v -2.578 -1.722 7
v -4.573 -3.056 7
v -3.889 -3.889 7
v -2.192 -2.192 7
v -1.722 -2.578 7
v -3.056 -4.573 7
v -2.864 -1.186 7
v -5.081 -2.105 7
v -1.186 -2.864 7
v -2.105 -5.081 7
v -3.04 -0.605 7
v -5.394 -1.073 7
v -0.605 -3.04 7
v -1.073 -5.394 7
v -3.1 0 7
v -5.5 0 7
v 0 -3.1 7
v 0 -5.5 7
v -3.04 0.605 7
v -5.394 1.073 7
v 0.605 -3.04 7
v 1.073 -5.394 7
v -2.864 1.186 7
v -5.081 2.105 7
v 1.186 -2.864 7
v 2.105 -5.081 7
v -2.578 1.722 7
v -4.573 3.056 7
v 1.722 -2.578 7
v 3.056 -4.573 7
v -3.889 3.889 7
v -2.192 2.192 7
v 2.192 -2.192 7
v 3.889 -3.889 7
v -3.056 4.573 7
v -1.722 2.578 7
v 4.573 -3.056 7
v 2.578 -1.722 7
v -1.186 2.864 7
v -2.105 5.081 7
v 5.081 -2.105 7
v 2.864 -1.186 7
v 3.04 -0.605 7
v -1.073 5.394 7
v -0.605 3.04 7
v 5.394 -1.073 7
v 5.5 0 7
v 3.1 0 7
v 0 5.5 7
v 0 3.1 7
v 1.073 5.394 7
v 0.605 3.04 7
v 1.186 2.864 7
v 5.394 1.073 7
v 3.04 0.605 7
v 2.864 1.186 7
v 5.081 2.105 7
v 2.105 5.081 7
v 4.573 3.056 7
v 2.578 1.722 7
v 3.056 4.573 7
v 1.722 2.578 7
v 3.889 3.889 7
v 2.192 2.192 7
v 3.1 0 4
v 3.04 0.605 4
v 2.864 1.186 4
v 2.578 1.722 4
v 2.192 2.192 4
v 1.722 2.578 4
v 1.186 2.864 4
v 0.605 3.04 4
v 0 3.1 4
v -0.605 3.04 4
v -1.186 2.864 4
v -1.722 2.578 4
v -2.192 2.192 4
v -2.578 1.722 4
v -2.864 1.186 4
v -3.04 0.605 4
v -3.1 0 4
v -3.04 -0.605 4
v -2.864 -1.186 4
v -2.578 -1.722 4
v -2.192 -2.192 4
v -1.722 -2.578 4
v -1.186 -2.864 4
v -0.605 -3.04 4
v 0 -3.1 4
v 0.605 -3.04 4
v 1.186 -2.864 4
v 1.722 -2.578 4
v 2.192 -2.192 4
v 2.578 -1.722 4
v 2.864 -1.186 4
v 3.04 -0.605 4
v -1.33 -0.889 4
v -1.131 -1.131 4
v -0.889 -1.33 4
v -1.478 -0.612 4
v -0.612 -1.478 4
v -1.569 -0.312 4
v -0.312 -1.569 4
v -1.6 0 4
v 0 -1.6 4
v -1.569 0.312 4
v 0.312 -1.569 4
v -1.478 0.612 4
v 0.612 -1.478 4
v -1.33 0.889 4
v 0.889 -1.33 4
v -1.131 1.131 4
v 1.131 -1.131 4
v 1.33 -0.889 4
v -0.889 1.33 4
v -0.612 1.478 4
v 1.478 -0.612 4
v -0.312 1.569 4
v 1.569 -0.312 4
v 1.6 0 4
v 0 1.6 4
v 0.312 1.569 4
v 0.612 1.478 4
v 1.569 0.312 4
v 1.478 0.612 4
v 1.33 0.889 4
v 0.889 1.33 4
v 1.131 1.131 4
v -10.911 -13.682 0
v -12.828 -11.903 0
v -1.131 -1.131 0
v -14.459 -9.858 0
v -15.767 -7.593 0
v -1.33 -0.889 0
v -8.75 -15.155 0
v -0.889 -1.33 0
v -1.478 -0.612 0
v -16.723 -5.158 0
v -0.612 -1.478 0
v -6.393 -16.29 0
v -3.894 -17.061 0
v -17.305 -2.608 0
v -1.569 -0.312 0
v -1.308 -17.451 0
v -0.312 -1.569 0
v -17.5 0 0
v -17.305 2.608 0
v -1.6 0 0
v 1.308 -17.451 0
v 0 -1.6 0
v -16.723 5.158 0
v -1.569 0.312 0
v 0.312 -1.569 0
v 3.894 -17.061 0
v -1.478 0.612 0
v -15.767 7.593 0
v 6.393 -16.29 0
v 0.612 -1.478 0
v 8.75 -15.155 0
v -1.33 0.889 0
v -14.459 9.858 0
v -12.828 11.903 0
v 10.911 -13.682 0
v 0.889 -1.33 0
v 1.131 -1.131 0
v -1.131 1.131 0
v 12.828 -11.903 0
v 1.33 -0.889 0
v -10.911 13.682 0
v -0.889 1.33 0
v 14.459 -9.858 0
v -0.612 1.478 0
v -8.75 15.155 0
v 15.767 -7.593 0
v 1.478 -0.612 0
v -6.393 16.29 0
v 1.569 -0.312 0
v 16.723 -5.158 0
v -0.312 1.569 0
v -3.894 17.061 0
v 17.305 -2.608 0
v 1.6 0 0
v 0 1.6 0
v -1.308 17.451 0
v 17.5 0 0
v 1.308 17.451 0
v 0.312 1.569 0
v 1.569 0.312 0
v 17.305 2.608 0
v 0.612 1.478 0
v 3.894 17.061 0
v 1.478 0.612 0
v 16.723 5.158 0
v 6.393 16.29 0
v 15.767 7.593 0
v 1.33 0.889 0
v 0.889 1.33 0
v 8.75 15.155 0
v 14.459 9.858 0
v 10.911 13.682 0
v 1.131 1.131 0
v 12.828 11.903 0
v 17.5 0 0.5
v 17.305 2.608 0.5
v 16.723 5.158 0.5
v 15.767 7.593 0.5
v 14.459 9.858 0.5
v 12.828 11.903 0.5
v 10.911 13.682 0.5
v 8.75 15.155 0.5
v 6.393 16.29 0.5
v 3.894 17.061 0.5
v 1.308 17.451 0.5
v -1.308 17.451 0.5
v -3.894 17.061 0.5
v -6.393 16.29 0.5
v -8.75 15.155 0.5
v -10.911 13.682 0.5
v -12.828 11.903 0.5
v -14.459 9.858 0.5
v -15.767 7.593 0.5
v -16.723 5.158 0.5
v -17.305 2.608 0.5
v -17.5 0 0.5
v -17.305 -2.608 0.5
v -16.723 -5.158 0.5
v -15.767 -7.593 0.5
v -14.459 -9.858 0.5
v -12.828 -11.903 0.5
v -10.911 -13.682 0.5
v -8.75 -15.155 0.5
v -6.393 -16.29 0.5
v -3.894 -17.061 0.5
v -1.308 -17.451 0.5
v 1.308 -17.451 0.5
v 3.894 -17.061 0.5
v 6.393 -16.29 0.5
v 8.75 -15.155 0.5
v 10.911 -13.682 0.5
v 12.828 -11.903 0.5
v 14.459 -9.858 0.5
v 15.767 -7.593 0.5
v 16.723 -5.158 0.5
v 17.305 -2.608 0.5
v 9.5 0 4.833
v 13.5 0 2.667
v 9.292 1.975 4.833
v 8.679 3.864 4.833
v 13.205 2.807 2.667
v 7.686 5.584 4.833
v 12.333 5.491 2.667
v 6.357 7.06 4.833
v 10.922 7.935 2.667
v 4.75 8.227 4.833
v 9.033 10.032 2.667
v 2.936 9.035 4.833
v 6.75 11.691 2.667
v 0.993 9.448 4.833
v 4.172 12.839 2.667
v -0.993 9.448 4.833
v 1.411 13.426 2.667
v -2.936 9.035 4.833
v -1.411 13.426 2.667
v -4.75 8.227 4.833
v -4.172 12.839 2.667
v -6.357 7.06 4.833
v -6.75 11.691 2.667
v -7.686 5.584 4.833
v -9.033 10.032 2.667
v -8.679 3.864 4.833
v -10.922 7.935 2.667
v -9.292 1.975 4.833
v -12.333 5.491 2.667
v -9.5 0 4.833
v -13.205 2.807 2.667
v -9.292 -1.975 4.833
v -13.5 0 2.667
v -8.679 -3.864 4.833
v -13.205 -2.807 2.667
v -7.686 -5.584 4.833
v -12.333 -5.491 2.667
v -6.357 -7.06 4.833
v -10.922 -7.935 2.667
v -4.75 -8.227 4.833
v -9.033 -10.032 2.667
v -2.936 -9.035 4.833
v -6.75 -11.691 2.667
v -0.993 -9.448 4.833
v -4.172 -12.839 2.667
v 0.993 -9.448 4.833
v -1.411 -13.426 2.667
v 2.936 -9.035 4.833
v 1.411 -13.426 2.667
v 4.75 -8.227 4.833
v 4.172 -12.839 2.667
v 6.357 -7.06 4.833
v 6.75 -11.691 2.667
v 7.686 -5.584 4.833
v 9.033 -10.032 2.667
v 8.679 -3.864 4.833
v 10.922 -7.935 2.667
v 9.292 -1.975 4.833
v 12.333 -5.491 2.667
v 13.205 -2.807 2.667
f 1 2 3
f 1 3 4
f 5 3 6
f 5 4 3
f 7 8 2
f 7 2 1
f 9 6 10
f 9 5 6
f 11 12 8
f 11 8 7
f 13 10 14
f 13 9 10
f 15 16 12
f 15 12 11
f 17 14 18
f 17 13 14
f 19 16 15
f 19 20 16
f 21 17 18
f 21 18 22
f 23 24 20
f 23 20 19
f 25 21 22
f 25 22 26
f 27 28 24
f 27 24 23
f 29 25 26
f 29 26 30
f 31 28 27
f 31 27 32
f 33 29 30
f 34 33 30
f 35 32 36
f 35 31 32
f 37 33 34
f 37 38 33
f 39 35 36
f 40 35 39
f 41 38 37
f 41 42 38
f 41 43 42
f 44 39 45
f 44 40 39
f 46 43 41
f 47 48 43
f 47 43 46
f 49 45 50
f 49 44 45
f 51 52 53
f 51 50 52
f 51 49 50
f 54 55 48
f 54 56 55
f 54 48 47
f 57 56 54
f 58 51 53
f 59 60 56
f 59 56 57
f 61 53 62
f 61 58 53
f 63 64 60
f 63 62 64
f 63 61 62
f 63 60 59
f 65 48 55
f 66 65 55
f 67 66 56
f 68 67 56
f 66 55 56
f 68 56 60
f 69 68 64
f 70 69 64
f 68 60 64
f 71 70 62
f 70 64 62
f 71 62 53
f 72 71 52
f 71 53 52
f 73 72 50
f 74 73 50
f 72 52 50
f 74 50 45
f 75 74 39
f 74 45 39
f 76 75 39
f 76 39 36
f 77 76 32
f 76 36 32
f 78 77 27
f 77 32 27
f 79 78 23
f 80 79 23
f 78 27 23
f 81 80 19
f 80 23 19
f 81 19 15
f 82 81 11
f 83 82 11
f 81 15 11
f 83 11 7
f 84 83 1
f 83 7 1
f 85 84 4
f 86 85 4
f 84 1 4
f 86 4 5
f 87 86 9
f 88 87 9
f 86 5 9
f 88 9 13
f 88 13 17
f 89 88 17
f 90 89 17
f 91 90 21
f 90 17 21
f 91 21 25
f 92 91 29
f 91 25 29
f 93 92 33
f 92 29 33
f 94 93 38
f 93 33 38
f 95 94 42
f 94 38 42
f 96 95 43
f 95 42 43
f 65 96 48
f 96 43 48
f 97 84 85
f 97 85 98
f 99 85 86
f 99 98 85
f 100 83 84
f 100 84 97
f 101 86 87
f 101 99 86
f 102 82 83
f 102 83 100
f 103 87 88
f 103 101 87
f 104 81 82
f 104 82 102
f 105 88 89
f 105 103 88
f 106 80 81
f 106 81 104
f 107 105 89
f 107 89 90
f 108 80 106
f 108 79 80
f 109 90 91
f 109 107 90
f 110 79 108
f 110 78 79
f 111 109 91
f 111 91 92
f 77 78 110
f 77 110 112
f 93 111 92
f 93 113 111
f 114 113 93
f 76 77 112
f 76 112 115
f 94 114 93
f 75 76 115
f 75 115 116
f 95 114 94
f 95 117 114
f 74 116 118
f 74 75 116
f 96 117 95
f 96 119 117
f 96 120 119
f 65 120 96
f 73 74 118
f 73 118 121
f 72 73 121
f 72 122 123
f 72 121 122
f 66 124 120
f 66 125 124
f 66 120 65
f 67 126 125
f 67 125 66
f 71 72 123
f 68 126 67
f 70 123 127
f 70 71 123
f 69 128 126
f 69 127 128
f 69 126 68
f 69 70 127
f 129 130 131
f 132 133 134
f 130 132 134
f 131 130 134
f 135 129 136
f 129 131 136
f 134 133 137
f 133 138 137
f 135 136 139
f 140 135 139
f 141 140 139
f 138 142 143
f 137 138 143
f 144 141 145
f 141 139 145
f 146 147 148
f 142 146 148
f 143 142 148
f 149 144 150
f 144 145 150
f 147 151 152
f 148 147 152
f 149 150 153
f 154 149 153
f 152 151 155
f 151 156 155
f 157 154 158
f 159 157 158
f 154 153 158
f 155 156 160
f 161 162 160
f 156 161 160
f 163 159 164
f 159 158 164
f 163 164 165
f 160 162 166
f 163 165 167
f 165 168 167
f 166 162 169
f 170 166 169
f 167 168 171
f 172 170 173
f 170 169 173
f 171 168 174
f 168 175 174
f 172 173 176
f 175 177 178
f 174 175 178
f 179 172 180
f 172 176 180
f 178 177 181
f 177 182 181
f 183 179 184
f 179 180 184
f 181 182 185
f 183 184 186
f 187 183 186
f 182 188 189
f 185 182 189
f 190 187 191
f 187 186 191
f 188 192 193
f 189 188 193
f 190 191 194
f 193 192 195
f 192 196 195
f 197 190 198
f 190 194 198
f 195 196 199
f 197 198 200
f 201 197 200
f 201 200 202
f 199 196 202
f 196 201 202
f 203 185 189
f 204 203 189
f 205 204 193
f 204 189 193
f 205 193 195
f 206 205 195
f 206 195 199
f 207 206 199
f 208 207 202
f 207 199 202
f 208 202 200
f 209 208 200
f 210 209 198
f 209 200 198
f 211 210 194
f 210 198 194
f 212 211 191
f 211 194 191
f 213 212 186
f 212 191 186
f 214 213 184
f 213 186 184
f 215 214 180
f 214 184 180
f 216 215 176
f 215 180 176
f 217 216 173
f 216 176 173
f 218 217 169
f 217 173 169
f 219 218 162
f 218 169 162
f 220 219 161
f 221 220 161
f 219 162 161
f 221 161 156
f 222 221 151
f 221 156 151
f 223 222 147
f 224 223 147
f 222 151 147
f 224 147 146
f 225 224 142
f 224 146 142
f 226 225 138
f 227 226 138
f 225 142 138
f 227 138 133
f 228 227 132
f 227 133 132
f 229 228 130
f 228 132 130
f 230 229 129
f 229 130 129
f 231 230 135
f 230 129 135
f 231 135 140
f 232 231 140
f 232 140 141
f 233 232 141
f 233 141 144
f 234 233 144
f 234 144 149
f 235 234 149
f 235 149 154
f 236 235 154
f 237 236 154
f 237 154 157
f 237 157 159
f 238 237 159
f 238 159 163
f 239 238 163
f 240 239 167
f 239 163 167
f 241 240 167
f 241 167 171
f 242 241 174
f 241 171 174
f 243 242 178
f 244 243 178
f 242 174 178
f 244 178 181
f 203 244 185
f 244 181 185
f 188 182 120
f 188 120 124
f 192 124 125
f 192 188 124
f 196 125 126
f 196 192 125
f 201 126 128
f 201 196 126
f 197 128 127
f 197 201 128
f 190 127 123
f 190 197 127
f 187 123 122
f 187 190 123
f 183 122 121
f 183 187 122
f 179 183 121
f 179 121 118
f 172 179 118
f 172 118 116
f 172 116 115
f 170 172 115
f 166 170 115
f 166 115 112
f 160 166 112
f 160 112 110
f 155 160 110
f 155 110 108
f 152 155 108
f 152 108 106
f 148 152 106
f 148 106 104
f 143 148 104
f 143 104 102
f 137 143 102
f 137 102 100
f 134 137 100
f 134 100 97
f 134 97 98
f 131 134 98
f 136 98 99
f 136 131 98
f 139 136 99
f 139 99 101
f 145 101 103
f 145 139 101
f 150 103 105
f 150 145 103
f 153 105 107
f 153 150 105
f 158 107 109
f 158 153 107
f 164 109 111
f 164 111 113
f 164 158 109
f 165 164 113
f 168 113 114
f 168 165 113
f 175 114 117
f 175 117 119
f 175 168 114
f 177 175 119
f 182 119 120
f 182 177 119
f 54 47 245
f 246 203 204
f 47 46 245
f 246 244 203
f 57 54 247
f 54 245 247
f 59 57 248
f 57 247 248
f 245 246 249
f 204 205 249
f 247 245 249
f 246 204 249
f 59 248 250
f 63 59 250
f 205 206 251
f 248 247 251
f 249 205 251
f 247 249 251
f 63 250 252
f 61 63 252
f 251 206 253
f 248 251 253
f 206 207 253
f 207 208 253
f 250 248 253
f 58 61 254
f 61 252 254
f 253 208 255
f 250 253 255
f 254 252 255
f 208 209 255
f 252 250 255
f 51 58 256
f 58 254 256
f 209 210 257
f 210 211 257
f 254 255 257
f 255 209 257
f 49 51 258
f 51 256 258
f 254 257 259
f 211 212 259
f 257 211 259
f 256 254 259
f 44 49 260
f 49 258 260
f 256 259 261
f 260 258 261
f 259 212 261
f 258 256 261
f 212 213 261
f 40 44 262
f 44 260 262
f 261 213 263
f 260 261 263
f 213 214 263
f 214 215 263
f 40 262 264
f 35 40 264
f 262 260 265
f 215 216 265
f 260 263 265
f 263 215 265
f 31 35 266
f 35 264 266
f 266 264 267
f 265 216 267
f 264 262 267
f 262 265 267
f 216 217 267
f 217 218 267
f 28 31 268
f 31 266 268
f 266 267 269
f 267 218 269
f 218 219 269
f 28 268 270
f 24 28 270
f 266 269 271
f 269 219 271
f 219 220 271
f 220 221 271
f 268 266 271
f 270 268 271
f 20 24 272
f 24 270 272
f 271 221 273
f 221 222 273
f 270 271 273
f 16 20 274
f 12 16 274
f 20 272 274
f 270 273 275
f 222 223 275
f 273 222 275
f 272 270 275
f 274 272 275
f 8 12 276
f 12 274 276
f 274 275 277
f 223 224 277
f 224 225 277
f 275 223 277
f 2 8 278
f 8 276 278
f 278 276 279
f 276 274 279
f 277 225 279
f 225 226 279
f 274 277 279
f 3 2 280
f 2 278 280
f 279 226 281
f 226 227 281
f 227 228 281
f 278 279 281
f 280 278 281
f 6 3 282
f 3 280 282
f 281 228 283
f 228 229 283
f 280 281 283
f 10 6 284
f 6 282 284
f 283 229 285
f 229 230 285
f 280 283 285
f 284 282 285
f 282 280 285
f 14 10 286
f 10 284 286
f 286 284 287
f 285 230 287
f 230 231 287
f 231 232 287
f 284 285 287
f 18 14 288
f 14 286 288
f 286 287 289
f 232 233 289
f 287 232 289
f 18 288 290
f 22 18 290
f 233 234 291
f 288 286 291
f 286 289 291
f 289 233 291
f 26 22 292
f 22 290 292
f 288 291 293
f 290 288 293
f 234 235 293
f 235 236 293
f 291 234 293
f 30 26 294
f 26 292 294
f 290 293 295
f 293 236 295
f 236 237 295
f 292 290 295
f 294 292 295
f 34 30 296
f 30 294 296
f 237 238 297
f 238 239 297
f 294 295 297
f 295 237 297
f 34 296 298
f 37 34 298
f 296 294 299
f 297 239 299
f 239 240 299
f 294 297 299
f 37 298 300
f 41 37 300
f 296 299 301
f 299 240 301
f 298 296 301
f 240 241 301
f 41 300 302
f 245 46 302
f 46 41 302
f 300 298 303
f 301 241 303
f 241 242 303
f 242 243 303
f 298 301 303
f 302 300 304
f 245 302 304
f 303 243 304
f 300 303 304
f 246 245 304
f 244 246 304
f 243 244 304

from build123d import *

# Parameters (mm, degrees)
F0_R     = 17.5
F0_R_2   = 1.6
F1_DEPTH = 7
F2_R     = 3.1
F2_R_2   = 1.6
F3_DEPTH = 3
F4_SIZE2 = 6.5
F4_SIZE  = 12


with BuildPart() as f1:
    # F0 (on Top) → F1 (new body)
    with BuildSketch(Plane.XY):
        Circle(F0_R)
        Circle(F0_R_2, mode=Mode.SUBTRACT)
    extrude(amount=F1_DEPTH)

    # F2 (on face) → F3 (cut)
    with BuildSketch(Plane.XY.offset(7)):
        Circle(F2_R)
        Circle(F2_R_2, mode=Mode.SUBTRACT)
    extrude(amount=-F3_DEPTH, mode=Mode.SUBTRACT)

    # F4
    f4_edges = [f1.edges().sort_by_distance(p)[0] for p in [
        (-17.5, 0, 7),
    ]]
    f4_side = f1.faces().sort_by_distance((-17.005025, 0, 7))[0]
    chamfer(f4_edges, length=F4_SIZE, length2=F4_SIZE2, reference=f4_side)


solid = f1.part
